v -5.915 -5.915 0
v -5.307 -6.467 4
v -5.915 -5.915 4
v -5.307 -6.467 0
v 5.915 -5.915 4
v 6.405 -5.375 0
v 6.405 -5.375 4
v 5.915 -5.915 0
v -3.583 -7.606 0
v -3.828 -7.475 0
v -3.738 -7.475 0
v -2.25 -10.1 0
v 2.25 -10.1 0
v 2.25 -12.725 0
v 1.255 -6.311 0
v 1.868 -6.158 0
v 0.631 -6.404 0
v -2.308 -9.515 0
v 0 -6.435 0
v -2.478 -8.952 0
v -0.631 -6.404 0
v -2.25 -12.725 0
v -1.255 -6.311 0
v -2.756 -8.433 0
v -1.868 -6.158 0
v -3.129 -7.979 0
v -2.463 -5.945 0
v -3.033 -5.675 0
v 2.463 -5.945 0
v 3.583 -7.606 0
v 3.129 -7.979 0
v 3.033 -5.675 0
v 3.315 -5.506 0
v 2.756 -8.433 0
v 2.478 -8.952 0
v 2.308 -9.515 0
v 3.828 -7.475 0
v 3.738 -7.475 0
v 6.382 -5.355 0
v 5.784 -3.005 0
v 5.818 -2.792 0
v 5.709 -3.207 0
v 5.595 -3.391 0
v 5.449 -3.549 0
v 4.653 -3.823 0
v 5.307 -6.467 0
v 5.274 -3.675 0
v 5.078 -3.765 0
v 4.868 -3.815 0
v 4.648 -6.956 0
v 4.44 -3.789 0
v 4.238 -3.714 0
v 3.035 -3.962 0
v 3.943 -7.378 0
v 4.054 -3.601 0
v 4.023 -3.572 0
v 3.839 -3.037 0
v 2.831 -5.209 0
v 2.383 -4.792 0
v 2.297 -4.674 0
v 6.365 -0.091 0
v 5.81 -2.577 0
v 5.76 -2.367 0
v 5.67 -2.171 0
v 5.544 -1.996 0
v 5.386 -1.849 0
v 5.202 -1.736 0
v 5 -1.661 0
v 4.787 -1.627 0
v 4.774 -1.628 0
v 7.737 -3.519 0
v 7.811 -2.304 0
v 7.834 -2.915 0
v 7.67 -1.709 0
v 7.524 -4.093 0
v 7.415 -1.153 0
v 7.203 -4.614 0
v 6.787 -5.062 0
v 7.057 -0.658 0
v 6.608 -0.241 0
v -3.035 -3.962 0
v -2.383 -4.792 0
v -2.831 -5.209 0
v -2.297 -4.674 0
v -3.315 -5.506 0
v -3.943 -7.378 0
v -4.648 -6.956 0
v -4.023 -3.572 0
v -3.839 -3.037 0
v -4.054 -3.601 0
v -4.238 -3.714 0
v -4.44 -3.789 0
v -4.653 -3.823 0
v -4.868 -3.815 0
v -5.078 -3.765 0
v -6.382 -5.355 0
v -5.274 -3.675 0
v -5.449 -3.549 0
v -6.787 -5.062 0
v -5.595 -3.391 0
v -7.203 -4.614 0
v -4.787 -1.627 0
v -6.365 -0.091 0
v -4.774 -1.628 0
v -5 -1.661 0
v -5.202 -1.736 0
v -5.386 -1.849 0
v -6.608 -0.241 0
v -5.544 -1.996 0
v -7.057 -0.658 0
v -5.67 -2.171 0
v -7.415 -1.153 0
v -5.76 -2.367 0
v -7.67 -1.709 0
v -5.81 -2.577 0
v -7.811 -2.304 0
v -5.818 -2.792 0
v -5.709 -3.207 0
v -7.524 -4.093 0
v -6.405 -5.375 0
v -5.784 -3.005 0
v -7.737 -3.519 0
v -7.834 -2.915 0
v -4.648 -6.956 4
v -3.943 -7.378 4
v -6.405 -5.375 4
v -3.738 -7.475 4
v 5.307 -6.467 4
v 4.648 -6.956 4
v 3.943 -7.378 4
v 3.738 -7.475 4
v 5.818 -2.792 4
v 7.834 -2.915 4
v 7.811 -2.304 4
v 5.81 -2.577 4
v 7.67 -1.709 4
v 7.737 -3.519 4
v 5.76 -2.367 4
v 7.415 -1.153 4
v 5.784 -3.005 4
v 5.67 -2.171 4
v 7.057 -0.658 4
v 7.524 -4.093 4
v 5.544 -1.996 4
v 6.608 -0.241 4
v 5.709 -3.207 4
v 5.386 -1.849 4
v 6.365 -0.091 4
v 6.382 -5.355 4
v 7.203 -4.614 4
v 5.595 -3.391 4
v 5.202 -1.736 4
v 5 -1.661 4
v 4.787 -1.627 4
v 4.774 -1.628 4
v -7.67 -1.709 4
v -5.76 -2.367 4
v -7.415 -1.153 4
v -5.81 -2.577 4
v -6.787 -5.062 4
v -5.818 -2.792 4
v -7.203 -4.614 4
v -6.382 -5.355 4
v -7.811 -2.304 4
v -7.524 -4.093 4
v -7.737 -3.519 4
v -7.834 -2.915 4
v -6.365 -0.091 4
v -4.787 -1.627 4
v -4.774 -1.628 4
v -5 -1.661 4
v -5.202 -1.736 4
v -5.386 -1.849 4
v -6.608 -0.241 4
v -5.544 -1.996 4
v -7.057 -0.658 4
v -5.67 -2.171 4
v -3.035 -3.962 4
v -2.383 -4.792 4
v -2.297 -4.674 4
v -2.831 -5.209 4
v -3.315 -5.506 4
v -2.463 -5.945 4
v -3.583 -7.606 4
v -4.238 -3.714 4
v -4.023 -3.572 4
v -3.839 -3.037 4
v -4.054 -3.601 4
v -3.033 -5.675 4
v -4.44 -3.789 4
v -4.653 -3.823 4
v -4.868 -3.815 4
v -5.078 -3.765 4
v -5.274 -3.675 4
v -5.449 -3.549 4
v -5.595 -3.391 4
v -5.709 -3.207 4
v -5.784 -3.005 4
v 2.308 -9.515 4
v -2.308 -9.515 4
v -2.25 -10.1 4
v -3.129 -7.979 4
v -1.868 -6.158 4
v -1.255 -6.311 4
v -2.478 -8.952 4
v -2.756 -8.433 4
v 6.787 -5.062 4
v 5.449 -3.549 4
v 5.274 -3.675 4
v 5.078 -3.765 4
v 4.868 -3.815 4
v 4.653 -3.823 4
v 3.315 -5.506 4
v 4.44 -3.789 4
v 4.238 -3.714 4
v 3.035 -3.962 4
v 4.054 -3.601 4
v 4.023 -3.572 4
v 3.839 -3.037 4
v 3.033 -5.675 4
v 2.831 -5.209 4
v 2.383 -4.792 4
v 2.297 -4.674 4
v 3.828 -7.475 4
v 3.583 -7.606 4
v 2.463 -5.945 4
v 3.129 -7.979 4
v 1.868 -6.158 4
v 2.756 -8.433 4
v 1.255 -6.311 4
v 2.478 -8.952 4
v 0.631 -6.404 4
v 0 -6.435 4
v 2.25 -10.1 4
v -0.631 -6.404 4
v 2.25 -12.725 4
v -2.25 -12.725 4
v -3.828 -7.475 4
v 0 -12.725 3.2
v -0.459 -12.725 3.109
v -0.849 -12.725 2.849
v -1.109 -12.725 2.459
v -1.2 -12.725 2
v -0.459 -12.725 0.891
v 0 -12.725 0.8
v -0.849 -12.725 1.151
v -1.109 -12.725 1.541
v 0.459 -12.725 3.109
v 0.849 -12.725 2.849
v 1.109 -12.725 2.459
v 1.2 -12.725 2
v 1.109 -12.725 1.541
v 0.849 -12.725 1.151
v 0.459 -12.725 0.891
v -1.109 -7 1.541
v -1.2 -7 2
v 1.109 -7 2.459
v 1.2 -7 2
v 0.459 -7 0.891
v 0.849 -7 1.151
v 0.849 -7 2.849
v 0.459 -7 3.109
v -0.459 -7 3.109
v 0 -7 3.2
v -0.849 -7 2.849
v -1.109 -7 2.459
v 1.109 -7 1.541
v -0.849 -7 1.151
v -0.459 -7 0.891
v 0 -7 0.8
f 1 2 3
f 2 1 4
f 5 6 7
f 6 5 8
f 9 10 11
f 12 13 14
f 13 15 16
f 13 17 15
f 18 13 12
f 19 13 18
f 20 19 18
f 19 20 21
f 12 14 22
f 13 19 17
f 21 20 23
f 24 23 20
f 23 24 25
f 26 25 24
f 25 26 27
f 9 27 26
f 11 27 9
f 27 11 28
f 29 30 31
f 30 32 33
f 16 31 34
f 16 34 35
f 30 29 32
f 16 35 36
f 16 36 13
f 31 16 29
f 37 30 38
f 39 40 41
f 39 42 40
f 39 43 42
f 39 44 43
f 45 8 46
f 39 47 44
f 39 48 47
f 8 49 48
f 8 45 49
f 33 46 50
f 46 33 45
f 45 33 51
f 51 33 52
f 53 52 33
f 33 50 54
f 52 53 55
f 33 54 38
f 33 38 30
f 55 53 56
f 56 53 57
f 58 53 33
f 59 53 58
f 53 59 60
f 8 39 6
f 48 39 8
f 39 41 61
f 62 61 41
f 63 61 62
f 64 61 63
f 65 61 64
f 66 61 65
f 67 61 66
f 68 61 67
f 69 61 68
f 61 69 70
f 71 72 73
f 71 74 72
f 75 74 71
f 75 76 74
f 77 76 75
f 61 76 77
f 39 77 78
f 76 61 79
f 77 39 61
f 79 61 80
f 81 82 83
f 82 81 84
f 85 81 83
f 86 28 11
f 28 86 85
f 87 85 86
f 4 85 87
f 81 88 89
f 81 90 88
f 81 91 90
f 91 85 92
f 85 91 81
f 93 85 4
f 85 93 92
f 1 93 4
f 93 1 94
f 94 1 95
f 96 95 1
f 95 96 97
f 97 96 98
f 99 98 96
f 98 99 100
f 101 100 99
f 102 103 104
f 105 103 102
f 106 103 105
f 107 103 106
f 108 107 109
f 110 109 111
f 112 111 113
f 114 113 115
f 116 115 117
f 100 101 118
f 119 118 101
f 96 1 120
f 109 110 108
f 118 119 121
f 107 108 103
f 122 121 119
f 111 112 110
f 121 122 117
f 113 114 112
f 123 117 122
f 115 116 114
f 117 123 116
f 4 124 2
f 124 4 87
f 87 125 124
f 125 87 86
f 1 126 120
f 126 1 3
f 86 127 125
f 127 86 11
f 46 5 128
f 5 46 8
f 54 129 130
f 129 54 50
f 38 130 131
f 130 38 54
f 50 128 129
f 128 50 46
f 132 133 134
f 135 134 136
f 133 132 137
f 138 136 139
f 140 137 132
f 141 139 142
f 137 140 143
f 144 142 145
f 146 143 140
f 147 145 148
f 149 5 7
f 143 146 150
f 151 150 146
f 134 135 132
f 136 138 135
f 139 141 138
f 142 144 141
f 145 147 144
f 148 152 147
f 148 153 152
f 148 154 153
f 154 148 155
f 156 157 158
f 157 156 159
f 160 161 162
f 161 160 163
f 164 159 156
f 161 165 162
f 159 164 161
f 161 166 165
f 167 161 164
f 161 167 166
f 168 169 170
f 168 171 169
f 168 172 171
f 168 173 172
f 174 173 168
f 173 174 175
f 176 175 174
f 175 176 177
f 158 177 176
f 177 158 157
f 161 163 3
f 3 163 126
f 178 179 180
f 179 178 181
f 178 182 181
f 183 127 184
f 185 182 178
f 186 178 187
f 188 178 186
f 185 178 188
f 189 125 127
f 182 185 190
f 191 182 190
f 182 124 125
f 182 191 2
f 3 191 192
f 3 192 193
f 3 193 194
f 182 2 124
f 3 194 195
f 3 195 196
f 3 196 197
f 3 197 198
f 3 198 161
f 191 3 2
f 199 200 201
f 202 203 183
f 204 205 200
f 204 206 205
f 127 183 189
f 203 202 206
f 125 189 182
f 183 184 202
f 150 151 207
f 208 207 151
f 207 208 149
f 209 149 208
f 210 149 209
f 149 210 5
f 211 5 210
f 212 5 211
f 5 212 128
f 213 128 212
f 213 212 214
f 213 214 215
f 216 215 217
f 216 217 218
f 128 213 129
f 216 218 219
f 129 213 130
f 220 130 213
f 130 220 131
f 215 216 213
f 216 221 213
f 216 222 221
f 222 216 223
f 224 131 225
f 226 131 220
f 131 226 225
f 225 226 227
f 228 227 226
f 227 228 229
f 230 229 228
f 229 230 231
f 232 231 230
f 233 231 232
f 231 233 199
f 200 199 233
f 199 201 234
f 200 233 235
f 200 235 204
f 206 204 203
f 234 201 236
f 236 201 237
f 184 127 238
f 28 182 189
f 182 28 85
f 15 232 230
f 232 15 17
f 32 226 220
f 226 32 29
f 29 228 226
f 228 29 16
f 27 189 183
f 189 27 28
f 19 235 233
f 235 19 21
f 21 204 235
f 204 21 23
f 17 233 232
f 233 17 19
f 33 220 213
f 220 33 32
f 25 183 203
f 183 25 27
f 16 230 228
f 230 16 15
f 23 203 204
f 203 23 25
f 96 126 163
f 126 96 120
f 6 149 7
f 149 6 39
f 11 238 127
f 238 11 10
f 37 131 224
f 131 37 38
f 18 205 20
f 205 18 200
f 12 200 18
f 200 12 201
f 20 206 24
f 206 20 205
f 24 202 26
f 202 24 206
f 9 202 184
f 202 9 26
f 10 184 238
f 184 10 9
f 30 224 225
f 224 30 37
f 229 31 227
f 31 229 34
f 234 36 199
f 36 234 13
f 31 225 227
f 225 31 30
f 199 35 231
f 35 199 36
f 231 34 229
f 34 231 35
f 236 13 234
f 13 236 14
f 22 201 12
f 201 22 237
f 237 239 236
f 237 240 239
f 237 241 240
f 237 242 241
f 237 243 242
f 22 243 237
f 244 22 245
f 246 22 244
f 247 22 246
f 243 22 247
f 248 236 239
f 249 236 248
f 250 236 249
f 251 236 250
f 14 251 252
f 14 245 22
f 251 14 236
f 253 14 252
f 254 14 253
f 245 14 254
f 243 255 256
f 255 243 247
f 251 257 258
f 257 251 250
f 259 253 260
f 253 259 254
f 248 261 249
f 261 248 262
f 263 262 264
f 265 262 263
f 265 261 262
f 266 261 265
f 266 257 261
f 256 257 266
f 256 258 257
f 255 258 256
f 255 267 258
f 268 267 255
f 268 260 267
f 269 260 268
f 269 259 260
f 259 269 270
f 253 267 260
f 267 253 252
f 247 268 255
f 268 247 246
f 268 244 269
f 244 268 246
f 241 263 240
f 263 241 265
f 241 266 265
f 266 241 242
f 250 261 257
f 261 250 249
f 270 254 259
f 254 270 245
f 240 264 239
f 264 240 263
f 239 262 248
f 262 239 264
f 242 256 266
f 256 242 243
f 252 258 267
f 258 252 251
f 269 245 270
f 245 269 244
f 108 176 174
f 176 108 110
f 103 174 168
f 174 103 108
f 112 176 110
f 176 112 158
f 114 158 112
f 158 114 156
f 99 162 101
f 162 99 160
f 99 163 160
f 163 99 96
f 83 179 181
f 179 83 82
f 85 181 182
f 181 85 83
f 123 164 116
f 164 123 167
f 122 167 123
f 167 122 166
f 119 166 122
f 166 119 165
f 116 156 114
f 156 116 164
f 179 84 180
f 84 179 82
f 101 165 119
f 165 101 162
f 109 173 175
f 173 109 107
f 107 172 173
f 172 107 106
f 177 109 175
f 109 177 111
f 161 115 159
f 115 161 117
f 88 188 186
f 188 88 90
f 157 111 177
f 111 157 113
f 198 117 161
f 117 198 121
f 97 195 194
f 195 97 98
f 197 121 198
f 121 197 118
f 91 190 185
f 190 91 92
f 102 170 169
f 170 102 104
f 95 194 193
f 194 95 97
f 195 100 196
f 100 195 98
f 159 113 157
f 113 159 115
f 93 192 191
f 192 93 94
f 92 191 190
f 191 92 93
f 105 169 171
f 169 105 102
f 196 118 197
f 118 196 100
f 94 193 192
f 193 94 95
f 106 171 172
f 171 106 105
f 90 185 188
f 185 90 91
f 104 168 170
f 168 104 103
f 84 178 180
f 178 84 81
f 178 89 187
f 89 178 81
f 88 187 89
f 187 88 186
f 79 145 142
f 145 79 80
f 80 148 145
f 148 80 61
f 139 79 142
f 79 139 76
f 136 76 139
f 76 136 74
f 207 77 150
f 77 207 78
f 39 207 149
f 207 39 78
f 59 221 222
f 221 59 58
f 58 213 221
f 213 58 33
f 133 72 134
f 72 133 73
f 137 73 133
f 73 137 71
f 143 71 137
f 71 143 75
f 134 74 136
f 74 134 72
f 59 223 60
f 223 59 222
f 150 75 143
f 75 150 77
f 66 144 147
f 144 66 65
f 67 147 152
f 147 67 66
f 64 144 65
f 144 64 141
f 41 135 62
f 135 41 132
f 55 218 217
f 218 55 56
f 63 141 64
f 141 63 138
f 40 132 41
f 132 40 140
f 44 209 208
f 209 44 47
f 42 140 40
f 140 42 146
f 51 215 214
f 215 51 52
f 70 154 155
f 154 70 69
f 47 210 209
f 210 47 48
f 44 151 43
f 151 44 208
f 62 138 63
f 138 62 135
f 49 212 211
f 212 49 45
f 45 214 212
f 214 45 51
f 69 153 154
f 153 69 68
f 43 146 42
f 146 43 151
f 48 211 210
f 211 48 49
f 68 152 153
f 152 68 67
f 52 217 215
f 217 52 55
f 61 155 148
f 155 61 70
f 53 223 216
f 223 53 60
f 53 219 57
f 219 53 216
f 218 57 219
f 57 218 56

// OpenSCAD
DEBUG_LAYER = 10;
WIRE_DIAMETER = 2;
WIRE_RADIUS = WIRE_DIAMETER / 2;
MARBLE_DIAMETER = 9.5;
MARBLE_RADIUS = MARBLE_DIAMETER / 2;
HOLDER_WIDTH = 1.5;
DEFAULT_SPACE_OFFSET = 1.1;
DEFAULT_HEIGHT = 4;

module tube(h, outer, inner, $fn = 32) {
    in = min(outer, inner);
    out = max(outer, inner);
    
    difference() {
        cylinder(h, out, out, $fn);
        translate([0, 0, -1]) 
            cylinder(h+2, in, in,  $fn);
    };
}

module rtCylinder(radius, posX, rotate, isTrim = false, h = DEFAULT_HEIGHT, $fn = 32, $posY = 0, $innerRotation = 0) {    
    rotate(rotate) {
        if (isTrim) {            
            translate([posX, $posY, -1])
                rotate($innerRotation)
                    cylinder(h + 2, radius, radius, $fn = $fn);
        } else {
            translate([posX, $posY, 0])
                rotate($innerRotation)
                    cylinder(h, radius, radius, $fn = $fn);
        }        
    }; 
}

module rtCube(width, length, posX, rotate, isTrim = false, h = DEFAULT_HEIGHT) {
    rotate(rotate) {
        if (isTrim) {
            translate([posX, 0, -1])
                cube([width, length, h + 2]);
        } else {
            translate([0, 0, 0])            
                cube([width, length, h]);
        }
    };
}

module wireHolders(h, wireRadius, marbleRadius, angle = 120, spaceOffset = DEFAULT_SPACE_OFFSET, $innerRotate = 0) {
    innerRadius = wireRadius * spaceOffset;
    outerRadius = innerRadius + HOLDER_WIDTH;
    halfRadius = innerRadius + ((outerRadius - innerRadius) / 2);
    wireGrip = 1;
    
    rotate([0, 0, angle])
        translate([0, marbleRadius + (wireRadius * .7), 0]) {
            rotate($innerRotate)
            union() {
                difference() {
                    tube(h, innerRadius, outerRadius * 1.2);
                    
                    translate([0,-.8,0])
                    rtCube(outerRadius * 4, outerRadius * 4, 0, 290, true);
                    
                    translate([.4, .4, 0])
                    rtCube(outerRadius * 2.8, outerRadius * 3, -3 * outerRadius, -250, true);
                }
               
                // SNAPS
                rtCylinder(wireGrip * 1.3, halfRadius * 1.05, 185, $fn=3, $innerRotation=-80, $posY = .15);
                *rtCylinder(wireGrip * .8, halfRadius * 1., 350, $fn=5, $innerRotation=-150, $posY = -.02);
            }
        }
}


    
// 9.5mm marble
// 2mm wire


//////
// MAIN BRACKET
//////
difference() {
union() {
    ringInnerRadius = MARBLE_RADIUS + (WIRE_RADIUS * DEFAULT_SPACE_OFFSET);
    ringOuterRadius = ringInnerRadius * 1.3;
    ringSubtractionRadius = (ringInnerRadius - MARBLE_RADIUS) * 1.1;
    ringTrimX = ringSubtractionRadius * -8;
    ringTrimWidth = ringSubtractionRadius * 10;
    ringTrimHeight = ringSubtractionRadius * 2 + (2 * DEFAULT_HEIGHT);

    capRadius = ((ringOuterRadius * 1.1) - (ringInnerRadius * 0.9)) / 2;
    capPosX = (ringInnerRadius * .9) + capRadius;
    
    // CAP LEFT
    *rtCylinder(capRadius, capPosX, 180);
    *rtCylinder(capRadius, capPosX, 0);
    
    // HOLDER SPACE REMOVAL
    difference() {
        tube(DEFAULT_HEIGHT, ringInnerRadius * 1.1, ringOuterRadius * 1.1, $fn = 64);
        
        rtCylinder(ringSubtractionRadius, ringInnerRadius, 220, true);
        rtCylinder(ringSubtractionRadius, ringInnerRadius, 320, true);
        

            rotate(220)
                translate([ringTrimX, -1 * ringTrimWidth, -1])
                    cube([ringTrimWidth * 2, ringTrimWidth, ringTrimHeight]);
        
            rotate(-40)
                translate([ringTrimX, 0, -1])
                    cube([ringTrimWidth * 2, ringTrimWidth, ringTrimHeight]);
    }
    

    union() {
            SUPPORT_CARVE_RADIUS = 3;
            SUPPORT_CARVE_OFFSET = SUPPORT_CARVE_RADIUS * 1.75;
            bracketY = -1 * (MARBLE_RADIUS + (WIRE_RADIUS * DEFAULT_SPACE_OFFSET) + (HOLDER_WIDTH * 2) + (SUPPORT_CARVE_RADIUS / 2) - .25);
            
            difference() {
                translate([-SUPPORT_CARVE_OFFSET, bracketY, 0])
                    cube([SUPPORT_CARVE_OFFSET * 2, SUPPORT_CARVE_OFFSET / 2, DEFAULT_HEIGHT]);

                translate([-SUPPORT_CARVE_OFFSET, bracketY, -1])
                    cylinder(DEFAULT_HEIGHT + 2, SUPPORT_CARVE_RADIUS, SUPPORT_CARVE_RADIUS, $fn = 32);

                translate([SUPPORT_CARVE_OFFSET, bracketY, -1])
                    cylinder(DEFAULT_HEIGHT + 2, SUPPORT_CARVE_RADIUS, SUPPORT_CARVE_RADIUS, $fn = 32);
            }
            
            translate([SUPPORT_CARVE_RADIUS * -.75, bracketY - SUPPORT_CARVE_OFFSET / 2, 0])
                cube([SUPPORT_CARVE_RADIUS * 1.5, SUPPORT_CARVE_OFFSET / 2, DEFAULT_HEIGHT]);
        }
    }
    
    rotate([90, 0, 0])
        translate([0, DEFAULT_HEIGHT / 2, 7])
            cylinder(20, WIRE_RADIUS * 1.2, WIRE_RADIUS * 1.2, $fn = 16);
    }



wireHolders(DEFAULT_HEIGHT, WIRE_RADIUS, MARBLE_RADIUS, 120, $innerRotate = -4);
mirror([90, 0, 0]) wireHolders(DEFAULT_HEIGHT, WIRE_RADIUS, MARBLE_RADIUS, 120, $innerRotate = -4);

color("#ff0000") {
    translate([0, .4, 0])
           circle(MARBLE_RADIUS, $fn=32);
    
    translate([4.77, -2.78, 0])
    circle(WIRE_RADIUS, $fn=32);
    *translate([0,-5,1.5]) 
        linear_extrude(3)
            import("track-bracket-180-3.svg", center=true);

}
